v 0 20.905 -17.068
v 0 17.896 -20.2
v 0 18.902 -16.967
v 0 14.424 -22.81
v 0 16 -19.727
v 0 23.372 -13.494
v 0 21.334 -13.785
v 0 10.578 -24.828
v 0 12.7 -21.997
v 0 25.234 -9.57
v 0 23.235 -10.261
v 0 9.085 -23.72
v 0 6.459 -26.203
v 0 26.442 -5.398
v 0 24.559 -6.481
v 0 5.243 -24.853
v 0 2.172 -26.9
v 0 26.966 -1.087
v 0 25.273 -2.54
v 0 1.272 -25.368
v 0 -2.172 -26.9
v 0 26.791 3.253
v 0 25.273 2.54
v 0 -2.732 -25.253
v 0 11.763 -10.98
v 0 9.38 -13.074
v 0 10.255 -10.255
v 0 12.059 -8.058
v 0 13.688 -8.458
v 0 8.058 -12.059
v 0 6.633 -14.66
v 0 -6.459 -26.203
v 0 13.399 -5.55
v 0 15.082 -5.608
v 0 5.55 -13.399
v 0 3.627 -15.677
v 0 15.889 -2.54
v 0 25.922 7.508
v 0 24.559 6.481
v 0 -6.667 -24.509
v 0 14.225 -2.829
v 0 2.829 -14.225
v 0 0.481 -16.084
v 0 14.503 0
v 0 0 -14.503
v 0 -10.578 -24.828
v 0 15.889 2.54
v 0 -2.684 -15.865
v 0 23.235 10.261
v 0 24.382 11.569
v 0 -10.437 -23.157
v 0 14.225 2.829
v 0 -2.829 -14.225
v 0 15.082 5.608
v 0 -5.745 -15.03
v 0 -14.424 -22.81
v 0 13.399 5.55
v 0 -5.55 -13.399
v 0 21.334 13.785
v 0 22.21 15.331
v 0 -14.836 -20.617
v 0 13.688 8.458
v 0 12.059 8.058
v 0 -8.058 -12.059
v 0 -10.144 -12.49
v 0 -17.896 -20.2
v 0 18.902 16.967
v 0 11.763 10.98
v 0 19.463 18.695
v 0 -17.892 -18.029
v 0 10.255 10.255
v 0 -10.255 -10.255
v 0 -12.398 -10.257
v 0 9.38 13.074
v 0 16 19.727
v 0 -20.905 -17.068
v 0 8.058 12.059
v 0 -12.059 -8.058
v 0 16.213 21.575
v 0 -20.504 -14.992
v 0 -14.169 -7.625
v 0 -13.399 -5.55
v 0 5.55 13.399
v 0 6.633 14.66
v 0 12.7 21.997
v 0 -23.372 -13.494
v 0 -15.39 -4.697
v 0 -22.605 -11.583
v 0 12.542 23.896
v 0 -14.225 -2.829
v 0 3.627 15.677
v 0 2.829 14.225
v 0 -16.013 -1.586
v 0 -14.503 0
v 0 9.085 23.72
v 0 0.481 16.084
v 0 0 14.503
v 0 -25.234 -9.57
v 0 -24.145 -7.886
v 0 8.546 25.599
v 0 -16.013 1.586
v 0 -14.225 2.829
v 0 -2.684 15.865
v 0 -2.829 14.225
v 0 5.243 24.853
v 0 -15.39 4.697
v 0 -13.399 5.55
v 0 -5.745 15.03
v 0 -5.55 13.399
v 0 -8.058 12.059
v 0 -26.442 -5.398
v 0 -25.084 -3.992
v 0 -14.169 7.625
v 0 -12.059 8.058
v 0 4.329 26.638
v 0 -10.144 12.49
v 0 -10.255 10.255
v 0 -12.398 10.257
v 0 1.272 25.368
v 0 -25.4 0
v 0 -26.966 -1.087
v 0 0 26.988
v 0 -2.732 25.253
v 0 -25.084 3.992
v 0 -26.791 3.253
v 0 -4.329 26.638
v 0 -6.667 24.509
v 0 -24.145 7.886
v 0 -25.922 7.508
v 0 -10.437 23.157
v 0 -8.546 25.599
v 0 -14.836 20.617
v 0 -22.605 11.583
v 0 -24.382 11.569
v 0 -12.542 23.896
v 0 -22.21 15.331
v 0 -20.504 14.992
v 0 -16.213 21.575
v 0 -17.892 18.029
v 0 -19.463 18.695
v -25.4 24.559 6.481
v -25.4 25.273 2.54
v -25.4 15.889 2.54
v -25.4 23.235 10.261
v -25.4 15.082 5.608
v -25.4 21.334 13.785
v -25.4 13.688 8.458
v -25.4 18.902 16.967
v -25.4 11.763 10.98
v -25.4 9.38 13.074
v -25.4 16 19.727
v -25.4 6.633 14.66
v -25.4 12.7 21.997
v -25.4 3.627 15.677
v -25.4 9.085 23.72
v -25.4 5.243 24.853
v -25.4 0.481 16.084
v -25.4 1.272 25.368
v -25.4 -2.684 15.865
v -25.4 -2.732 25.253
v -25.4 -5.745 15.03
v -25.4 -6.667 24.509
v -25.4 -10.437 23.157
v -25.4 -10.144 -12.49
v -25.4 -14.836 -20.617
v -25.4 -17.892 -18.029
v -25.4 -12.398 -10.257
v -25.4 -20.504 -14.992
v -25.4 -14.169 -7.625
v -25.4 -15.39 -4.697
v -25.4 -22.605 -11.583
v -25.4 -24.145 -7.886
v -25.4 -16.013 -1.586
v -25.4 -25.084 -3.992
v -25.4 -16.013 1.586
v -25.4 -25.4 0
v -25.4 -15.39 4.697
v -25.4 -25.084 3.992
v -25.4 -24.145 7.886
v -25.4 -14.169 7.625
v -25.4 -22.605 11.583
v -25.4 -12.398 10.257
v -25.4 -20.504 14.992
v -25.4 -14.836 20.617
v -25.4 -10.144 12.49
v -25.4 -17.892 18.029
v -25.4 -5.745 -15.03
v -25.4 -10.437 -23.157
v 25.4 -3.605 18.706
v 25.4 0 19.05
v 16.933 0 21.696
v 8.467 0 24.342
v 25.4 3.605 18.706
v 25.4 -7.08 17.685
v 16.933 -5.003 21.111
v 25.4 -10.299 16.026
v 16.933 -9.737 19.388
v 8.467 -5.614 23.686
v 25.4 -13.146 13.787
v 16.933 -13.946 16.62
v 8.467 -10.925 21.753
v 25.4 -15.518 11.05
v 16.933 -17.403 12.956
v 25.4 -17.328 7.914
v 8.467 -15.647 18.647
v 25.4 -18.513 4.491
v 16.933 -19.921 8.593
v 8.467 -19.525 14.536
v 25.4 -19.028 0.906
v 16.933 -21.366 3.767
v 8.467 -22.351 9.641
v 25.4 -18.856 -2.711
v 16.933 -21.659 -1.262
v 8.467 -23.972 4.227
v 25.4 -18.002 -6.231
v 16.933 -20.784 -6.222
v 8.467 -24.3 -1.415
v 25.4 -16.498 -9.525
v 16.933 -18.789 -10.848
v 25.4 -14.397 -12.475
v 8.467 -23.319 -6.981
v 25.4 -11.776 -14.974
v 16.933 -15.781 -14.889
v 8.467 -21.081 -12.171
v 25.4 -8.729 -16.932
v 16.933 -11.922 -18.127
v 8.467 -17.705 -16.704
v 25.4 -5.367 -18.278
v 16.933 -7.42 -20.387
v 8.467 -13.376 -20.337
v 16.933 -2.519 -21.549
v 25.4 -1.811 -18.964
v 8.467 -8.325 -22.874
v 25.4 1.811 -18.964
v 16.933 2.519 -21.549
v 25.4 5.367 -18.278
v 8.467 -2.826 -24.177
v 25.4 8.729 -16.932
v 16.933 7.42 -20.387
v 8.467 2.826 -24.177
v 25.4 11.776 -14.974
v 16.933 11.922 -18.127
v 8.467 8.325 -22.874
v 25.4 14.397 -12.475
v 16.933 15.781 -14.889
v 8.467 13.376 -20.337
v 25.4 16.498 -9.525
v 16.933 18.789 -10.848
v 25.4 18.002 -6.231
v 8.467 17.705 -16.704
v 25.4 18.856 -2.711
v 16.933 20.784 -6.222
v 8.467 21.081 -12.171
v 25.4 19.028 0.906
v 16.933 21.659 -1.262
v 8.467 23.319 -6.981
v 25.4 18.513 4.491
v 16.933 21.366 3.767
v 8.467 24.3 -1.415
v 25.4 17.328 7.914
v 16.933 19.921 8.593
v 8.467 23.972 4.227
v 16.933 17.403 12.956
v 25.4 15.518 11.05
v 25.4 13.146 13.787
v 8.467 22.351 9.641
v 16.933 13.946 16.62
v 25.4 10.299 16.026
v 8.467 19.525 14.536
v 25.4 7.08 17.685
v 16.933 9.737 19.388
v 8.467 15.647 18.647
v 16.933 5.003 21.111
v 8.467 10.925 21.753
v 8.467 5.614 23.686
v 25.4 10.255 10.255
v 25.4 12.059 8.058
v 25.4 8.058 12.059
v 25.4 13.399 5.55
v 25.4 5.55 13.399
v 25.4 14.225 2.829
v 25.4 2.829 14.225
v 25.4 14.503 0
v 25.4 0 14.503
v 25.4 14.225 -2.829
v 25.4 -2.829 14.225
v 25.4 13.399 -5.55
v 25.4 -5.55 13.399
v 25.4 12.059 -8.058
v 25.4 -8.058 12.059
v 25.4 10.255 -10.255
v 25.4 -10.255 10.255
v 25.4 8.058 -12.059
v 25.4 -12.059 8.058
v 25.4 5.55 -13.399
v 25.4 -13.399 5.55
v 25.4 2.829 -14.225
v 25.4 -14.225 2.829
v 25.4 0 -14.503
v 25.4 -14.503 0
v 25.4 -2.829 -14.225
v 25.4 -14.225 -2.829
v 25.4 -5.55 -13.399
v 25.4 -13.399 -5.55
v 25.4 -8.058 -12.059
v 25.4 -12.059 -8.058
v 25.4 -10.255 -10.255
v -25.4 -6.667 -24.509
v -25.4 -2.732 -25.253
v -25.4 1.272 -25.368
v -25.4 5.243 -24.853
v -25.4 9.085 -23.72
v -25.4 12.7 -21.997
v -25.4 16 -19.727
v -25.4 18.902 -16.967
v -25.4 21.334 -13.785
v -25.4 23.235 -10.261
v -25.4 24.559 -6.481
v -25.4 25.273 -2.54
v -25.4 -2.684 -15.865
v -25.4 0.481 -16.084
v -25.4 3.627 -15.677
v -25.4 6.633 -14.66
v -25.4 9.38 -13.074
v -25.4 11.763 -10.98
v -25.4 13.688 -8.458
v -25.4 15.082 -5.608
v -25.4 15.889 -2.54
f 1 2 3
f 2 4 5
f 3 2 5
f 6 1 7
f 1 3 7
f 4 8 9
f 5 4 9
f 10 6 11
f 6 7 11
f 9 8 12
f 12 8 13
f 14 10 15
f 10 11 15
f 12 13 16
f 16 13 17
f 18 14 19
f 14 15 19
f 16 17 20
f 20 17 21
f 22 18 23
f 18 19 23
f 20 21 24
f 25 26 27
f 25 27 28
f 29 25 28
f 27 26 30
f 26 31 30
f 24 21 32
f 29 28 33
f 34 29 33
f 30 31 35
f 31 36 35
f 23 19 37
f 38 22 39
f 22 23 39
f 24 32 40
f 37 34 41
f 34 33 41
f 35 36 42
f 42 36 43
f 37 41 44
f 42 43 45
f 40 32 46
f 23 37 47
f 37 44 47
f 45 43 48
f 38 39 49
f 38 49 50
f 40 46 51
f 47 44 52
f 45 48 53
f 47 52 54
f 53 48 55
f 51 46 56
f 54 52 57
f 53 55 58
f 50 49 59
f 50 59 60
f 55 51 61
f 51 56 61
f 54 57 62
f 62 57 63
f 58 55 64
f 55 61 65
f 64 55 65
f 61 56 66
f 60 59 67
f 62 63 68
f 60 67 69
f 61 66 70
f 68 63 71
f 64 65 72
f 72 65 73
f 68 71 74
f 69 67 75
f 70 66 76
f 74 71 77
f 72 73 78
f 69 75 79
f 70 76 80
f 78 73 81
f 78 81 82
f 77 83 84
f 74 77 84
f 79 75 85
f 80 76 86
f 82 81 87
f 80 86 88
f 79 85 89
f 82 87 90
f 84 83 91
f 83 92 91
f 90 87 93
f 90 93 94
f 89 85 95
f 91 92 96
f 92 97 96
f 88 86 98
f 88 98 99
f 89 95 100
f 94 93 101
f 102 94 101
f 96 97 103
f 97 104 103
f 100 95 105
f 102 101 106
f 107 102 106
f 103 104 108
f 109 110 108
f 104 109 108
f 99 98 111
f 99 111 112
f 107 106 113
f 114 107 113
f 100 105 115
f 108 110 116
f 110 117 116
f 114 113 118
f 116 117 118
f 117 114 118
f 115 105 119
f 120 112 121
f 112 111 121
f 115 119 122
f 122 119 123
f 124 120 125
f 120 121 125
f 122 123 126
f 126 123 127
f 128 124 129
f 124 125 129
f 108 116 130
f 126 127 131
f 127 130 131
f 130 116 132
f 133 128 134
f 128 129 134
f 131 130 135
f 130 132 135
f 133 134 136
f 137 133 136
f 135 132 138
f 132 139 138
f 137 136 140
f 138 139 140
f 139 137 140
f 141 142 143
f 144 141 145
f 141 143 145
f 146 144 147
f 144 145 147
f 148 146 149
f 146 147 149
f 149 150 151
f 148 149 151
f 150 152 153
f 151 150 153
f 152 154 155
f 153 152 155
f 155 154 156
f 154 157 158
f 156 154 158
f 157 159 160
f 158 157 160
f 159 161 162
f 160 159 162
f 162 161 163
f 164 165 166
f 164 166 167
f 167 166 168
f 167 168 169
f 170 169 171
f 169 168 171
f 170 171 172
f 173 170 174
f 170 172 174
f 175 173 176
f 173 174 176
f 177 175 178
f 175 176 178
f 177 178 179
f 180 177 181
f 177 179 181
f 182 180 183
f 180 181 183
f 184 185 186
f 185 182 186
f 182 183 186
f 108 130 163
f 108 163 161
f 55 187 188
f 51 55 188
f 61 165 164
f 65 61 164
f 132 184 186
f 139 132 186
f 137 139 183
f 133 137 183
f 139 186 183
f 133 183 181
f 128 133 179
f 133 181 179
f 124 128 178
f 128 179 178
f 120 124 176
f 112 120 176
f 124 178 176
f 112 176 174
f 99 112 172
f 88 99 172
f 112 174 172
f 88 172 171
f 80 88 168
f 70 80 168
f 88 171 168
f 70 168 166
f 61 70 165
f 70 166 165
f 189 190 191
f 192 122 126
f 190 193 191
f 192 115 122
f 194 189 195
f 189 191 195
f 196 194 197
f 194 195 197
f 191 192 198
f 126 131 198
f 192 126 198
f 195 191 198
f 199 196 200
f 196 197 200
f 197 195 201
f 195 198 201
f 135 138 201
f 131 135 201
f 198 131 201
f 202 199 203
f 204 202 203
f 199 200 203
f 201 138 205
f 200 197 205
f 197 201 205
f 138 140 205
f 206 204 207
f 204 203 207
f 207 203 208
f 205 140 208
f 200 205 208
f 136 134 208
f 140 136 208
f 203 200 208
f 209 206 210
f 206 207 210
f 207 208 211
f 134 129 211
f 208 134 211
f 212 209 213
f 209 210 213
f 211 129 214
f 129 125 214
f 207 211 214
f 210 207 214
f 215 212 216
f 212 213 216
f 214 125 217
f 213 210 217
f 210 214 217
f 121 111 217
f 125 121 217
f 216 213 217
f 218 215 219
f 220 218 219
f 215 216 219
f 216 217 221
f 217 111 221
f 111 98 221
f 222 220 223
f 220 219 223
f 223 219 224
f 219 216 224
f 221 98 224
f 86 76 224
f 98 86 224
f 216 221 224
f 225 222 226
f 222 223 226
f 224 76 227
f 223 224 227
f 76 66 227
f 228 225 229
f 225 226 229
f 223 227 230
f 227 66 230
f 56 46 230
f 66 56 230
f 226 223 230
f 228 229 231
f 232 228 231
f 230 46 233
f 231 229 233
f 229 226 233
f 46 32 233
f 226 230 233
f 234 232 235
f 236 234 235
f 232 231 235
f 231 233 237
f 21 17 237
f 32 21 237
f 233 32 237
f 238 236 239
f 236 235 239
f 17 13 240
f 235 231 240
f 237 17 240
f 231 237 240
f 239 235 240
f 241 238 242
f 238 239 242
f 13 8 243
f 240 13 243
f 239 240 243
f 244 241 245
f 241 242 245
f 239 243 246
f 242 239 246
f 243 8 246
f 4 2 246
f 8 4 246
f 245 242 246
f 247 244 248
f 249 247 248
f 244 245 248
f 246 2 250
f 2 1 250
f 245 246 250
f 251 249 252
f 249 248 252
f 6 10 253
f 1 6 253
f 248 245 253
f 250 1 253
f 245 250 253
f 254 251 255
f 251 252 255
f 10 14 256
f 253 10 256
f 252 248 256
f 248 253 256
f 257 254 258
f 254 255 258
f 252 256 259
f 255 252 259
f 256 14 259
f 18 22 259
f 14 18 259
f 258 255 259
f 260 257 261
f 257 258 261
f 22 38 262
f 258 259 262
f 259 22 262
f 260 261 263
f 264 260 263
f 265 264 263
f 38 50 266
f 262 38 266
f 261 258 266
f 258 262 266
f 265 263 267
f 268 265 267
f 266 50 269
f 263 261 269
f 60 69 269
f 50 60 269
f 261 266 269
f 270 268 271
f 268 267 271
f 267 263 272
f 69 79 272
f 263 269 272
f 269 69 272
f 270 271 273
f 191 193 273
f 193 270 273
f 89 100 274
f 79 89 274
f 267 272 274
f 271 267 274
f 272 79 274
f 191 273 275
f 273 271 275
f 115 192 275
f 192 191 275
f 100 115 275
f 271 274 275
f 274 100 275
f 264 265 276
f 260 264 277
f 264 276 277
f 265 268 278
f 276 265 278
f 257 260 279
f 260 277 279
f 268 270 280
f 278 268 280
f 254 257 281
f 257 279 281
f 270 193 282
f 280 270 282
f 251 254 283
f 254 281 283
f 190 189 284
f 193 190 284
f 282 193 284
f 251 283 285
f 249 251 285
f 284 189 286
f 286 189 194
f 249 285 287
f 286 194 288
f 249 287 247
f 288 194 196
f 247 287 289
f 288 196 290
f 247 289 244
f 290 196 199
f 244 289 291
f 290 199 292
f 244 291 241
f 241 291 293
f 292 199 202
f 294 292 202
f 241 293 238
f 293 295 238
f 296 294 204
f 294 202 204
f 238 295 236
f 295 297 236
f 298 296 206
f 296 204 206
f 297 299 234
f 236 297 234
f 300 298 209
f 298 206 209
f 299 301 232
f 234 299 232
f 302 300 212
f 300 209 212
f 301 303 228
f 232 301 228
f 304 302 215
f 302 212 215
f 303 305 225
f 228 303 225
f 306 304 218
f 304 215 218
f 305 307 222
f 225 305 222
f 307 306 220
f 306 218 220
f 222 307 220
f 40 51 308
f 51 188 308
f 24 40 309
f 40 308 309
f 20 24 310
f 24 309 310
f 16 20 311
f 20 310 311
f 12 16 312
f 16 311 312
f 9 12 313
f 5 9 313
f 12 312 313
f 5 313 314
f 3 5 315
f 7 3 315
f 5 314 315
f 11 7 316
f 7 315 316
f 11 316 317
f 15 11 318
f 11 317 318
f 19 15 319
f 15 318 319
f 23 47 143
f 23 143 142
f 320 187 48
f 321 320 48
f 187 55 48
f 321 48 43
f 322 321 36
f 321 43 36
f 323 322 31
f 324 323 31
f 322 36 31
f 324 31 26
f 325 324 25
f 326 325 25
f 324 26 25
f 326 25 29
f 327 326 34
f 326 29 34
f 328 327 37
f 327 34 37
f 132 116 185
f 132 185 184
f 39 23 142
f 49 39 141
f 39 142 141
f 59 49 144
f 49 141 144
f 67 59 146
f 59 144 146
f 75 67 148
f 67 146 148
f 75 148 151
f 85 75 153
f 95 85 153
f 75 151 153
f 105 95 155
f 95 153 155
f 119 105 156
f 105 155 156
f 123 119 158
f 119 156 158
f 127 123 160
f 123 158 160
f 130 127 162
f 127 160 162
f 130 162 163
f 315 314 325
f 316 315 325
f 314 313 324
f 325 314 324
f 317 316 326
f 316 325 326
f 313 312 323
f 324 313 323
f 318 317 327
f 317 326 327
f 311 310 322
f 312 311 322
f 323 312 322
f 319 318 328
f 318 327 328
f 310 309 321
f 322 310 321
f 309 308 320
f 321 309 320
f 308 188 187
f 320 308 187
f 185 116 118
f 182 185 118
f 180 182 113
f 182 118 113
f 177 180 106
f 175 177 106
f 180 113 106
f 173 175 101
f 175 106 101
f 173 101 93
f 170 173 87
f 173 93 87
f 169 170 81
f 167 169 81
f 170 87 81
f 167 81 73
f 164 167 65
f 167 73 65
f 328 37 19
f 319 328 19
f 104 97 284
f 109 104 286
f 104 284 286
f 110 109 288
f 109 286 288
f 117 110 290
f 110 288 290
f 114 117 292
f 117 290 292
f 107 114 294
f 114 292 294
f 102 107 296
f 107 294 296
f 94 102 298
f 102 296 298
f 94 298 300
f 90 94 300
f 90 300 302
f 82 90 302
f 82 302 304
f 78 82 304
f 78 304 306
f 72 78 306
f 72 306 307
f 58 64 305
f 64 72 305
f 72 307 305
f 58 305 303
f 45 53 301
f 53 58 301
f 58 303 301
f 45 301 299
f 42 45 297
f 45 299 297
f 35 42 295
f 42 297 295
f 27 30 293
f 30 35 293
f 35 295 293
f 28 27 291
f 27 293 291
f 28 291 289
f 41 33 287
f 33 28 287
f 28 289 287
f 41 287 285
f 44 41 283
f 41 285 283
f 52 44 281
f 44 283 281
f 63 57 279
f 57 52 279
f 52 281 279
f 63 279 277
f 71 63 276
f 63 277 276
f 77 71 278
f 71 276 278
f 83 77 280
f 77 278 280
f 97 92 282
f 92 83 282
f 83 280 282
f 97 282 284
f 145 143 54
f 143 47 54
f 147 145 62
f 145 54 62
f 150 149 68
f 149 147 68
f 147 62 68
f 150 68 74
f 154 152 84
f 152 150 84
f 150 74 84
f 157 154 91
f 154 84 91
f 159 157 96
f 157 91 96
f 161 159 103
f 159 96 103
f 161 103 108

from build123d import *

# Parameters (mm, degrees)
SKETCH2_W          = 5.08
SKETCH2_H          = 25.4
CUT_EXTRUDE1_DEPTH = 25.4


with BuildPart() as part:
    # Sketch1 → Revolve1 (revolve)
    with BuildSketch(Plane.XY, mode=Mode.PRIVATE) as revolve1_sk:
        Polygon((0, 14.5034), (25.4, 14.5034), (25.4, 19.05), (0, 26.9875), (0, 25.4), (-25.4, 25.4), (-25.4, 16.0909), (0, 16.0909), align=None)
    revolve(revolve1_sk.sketch.rotate(Axis((-1.27, 0, 0), (1, 0, 0)), 90), axis=Axis((-1.27, 0, 0), (1, 0, 0)))

    # Sketch2 → Cut-Extrude1 (cut)
    with BuildSketch(Plane.ZY.offset(25.4)):
        Polygon((28.76630657, -13.675295474), (6.769261314, -0.975295474), (4.229261314, -5.374704526), (26.22630657, -18.074704526), align=None)
        with Locations((0, 19.05)):
            Rectangle(SKETCH2_W, SKETCH2_H)
        Polygon((-26.22630657, -18.074704526), (-4.229261314, -5.374704526), (-6.769261314, -0.975295474), (-28.76630657, -13.675295474), align=None)
    extrude(amount=-CUT_EXTRUDE1_DEPTH, mode=Mode.SUBTRACT)


solid = part.part
